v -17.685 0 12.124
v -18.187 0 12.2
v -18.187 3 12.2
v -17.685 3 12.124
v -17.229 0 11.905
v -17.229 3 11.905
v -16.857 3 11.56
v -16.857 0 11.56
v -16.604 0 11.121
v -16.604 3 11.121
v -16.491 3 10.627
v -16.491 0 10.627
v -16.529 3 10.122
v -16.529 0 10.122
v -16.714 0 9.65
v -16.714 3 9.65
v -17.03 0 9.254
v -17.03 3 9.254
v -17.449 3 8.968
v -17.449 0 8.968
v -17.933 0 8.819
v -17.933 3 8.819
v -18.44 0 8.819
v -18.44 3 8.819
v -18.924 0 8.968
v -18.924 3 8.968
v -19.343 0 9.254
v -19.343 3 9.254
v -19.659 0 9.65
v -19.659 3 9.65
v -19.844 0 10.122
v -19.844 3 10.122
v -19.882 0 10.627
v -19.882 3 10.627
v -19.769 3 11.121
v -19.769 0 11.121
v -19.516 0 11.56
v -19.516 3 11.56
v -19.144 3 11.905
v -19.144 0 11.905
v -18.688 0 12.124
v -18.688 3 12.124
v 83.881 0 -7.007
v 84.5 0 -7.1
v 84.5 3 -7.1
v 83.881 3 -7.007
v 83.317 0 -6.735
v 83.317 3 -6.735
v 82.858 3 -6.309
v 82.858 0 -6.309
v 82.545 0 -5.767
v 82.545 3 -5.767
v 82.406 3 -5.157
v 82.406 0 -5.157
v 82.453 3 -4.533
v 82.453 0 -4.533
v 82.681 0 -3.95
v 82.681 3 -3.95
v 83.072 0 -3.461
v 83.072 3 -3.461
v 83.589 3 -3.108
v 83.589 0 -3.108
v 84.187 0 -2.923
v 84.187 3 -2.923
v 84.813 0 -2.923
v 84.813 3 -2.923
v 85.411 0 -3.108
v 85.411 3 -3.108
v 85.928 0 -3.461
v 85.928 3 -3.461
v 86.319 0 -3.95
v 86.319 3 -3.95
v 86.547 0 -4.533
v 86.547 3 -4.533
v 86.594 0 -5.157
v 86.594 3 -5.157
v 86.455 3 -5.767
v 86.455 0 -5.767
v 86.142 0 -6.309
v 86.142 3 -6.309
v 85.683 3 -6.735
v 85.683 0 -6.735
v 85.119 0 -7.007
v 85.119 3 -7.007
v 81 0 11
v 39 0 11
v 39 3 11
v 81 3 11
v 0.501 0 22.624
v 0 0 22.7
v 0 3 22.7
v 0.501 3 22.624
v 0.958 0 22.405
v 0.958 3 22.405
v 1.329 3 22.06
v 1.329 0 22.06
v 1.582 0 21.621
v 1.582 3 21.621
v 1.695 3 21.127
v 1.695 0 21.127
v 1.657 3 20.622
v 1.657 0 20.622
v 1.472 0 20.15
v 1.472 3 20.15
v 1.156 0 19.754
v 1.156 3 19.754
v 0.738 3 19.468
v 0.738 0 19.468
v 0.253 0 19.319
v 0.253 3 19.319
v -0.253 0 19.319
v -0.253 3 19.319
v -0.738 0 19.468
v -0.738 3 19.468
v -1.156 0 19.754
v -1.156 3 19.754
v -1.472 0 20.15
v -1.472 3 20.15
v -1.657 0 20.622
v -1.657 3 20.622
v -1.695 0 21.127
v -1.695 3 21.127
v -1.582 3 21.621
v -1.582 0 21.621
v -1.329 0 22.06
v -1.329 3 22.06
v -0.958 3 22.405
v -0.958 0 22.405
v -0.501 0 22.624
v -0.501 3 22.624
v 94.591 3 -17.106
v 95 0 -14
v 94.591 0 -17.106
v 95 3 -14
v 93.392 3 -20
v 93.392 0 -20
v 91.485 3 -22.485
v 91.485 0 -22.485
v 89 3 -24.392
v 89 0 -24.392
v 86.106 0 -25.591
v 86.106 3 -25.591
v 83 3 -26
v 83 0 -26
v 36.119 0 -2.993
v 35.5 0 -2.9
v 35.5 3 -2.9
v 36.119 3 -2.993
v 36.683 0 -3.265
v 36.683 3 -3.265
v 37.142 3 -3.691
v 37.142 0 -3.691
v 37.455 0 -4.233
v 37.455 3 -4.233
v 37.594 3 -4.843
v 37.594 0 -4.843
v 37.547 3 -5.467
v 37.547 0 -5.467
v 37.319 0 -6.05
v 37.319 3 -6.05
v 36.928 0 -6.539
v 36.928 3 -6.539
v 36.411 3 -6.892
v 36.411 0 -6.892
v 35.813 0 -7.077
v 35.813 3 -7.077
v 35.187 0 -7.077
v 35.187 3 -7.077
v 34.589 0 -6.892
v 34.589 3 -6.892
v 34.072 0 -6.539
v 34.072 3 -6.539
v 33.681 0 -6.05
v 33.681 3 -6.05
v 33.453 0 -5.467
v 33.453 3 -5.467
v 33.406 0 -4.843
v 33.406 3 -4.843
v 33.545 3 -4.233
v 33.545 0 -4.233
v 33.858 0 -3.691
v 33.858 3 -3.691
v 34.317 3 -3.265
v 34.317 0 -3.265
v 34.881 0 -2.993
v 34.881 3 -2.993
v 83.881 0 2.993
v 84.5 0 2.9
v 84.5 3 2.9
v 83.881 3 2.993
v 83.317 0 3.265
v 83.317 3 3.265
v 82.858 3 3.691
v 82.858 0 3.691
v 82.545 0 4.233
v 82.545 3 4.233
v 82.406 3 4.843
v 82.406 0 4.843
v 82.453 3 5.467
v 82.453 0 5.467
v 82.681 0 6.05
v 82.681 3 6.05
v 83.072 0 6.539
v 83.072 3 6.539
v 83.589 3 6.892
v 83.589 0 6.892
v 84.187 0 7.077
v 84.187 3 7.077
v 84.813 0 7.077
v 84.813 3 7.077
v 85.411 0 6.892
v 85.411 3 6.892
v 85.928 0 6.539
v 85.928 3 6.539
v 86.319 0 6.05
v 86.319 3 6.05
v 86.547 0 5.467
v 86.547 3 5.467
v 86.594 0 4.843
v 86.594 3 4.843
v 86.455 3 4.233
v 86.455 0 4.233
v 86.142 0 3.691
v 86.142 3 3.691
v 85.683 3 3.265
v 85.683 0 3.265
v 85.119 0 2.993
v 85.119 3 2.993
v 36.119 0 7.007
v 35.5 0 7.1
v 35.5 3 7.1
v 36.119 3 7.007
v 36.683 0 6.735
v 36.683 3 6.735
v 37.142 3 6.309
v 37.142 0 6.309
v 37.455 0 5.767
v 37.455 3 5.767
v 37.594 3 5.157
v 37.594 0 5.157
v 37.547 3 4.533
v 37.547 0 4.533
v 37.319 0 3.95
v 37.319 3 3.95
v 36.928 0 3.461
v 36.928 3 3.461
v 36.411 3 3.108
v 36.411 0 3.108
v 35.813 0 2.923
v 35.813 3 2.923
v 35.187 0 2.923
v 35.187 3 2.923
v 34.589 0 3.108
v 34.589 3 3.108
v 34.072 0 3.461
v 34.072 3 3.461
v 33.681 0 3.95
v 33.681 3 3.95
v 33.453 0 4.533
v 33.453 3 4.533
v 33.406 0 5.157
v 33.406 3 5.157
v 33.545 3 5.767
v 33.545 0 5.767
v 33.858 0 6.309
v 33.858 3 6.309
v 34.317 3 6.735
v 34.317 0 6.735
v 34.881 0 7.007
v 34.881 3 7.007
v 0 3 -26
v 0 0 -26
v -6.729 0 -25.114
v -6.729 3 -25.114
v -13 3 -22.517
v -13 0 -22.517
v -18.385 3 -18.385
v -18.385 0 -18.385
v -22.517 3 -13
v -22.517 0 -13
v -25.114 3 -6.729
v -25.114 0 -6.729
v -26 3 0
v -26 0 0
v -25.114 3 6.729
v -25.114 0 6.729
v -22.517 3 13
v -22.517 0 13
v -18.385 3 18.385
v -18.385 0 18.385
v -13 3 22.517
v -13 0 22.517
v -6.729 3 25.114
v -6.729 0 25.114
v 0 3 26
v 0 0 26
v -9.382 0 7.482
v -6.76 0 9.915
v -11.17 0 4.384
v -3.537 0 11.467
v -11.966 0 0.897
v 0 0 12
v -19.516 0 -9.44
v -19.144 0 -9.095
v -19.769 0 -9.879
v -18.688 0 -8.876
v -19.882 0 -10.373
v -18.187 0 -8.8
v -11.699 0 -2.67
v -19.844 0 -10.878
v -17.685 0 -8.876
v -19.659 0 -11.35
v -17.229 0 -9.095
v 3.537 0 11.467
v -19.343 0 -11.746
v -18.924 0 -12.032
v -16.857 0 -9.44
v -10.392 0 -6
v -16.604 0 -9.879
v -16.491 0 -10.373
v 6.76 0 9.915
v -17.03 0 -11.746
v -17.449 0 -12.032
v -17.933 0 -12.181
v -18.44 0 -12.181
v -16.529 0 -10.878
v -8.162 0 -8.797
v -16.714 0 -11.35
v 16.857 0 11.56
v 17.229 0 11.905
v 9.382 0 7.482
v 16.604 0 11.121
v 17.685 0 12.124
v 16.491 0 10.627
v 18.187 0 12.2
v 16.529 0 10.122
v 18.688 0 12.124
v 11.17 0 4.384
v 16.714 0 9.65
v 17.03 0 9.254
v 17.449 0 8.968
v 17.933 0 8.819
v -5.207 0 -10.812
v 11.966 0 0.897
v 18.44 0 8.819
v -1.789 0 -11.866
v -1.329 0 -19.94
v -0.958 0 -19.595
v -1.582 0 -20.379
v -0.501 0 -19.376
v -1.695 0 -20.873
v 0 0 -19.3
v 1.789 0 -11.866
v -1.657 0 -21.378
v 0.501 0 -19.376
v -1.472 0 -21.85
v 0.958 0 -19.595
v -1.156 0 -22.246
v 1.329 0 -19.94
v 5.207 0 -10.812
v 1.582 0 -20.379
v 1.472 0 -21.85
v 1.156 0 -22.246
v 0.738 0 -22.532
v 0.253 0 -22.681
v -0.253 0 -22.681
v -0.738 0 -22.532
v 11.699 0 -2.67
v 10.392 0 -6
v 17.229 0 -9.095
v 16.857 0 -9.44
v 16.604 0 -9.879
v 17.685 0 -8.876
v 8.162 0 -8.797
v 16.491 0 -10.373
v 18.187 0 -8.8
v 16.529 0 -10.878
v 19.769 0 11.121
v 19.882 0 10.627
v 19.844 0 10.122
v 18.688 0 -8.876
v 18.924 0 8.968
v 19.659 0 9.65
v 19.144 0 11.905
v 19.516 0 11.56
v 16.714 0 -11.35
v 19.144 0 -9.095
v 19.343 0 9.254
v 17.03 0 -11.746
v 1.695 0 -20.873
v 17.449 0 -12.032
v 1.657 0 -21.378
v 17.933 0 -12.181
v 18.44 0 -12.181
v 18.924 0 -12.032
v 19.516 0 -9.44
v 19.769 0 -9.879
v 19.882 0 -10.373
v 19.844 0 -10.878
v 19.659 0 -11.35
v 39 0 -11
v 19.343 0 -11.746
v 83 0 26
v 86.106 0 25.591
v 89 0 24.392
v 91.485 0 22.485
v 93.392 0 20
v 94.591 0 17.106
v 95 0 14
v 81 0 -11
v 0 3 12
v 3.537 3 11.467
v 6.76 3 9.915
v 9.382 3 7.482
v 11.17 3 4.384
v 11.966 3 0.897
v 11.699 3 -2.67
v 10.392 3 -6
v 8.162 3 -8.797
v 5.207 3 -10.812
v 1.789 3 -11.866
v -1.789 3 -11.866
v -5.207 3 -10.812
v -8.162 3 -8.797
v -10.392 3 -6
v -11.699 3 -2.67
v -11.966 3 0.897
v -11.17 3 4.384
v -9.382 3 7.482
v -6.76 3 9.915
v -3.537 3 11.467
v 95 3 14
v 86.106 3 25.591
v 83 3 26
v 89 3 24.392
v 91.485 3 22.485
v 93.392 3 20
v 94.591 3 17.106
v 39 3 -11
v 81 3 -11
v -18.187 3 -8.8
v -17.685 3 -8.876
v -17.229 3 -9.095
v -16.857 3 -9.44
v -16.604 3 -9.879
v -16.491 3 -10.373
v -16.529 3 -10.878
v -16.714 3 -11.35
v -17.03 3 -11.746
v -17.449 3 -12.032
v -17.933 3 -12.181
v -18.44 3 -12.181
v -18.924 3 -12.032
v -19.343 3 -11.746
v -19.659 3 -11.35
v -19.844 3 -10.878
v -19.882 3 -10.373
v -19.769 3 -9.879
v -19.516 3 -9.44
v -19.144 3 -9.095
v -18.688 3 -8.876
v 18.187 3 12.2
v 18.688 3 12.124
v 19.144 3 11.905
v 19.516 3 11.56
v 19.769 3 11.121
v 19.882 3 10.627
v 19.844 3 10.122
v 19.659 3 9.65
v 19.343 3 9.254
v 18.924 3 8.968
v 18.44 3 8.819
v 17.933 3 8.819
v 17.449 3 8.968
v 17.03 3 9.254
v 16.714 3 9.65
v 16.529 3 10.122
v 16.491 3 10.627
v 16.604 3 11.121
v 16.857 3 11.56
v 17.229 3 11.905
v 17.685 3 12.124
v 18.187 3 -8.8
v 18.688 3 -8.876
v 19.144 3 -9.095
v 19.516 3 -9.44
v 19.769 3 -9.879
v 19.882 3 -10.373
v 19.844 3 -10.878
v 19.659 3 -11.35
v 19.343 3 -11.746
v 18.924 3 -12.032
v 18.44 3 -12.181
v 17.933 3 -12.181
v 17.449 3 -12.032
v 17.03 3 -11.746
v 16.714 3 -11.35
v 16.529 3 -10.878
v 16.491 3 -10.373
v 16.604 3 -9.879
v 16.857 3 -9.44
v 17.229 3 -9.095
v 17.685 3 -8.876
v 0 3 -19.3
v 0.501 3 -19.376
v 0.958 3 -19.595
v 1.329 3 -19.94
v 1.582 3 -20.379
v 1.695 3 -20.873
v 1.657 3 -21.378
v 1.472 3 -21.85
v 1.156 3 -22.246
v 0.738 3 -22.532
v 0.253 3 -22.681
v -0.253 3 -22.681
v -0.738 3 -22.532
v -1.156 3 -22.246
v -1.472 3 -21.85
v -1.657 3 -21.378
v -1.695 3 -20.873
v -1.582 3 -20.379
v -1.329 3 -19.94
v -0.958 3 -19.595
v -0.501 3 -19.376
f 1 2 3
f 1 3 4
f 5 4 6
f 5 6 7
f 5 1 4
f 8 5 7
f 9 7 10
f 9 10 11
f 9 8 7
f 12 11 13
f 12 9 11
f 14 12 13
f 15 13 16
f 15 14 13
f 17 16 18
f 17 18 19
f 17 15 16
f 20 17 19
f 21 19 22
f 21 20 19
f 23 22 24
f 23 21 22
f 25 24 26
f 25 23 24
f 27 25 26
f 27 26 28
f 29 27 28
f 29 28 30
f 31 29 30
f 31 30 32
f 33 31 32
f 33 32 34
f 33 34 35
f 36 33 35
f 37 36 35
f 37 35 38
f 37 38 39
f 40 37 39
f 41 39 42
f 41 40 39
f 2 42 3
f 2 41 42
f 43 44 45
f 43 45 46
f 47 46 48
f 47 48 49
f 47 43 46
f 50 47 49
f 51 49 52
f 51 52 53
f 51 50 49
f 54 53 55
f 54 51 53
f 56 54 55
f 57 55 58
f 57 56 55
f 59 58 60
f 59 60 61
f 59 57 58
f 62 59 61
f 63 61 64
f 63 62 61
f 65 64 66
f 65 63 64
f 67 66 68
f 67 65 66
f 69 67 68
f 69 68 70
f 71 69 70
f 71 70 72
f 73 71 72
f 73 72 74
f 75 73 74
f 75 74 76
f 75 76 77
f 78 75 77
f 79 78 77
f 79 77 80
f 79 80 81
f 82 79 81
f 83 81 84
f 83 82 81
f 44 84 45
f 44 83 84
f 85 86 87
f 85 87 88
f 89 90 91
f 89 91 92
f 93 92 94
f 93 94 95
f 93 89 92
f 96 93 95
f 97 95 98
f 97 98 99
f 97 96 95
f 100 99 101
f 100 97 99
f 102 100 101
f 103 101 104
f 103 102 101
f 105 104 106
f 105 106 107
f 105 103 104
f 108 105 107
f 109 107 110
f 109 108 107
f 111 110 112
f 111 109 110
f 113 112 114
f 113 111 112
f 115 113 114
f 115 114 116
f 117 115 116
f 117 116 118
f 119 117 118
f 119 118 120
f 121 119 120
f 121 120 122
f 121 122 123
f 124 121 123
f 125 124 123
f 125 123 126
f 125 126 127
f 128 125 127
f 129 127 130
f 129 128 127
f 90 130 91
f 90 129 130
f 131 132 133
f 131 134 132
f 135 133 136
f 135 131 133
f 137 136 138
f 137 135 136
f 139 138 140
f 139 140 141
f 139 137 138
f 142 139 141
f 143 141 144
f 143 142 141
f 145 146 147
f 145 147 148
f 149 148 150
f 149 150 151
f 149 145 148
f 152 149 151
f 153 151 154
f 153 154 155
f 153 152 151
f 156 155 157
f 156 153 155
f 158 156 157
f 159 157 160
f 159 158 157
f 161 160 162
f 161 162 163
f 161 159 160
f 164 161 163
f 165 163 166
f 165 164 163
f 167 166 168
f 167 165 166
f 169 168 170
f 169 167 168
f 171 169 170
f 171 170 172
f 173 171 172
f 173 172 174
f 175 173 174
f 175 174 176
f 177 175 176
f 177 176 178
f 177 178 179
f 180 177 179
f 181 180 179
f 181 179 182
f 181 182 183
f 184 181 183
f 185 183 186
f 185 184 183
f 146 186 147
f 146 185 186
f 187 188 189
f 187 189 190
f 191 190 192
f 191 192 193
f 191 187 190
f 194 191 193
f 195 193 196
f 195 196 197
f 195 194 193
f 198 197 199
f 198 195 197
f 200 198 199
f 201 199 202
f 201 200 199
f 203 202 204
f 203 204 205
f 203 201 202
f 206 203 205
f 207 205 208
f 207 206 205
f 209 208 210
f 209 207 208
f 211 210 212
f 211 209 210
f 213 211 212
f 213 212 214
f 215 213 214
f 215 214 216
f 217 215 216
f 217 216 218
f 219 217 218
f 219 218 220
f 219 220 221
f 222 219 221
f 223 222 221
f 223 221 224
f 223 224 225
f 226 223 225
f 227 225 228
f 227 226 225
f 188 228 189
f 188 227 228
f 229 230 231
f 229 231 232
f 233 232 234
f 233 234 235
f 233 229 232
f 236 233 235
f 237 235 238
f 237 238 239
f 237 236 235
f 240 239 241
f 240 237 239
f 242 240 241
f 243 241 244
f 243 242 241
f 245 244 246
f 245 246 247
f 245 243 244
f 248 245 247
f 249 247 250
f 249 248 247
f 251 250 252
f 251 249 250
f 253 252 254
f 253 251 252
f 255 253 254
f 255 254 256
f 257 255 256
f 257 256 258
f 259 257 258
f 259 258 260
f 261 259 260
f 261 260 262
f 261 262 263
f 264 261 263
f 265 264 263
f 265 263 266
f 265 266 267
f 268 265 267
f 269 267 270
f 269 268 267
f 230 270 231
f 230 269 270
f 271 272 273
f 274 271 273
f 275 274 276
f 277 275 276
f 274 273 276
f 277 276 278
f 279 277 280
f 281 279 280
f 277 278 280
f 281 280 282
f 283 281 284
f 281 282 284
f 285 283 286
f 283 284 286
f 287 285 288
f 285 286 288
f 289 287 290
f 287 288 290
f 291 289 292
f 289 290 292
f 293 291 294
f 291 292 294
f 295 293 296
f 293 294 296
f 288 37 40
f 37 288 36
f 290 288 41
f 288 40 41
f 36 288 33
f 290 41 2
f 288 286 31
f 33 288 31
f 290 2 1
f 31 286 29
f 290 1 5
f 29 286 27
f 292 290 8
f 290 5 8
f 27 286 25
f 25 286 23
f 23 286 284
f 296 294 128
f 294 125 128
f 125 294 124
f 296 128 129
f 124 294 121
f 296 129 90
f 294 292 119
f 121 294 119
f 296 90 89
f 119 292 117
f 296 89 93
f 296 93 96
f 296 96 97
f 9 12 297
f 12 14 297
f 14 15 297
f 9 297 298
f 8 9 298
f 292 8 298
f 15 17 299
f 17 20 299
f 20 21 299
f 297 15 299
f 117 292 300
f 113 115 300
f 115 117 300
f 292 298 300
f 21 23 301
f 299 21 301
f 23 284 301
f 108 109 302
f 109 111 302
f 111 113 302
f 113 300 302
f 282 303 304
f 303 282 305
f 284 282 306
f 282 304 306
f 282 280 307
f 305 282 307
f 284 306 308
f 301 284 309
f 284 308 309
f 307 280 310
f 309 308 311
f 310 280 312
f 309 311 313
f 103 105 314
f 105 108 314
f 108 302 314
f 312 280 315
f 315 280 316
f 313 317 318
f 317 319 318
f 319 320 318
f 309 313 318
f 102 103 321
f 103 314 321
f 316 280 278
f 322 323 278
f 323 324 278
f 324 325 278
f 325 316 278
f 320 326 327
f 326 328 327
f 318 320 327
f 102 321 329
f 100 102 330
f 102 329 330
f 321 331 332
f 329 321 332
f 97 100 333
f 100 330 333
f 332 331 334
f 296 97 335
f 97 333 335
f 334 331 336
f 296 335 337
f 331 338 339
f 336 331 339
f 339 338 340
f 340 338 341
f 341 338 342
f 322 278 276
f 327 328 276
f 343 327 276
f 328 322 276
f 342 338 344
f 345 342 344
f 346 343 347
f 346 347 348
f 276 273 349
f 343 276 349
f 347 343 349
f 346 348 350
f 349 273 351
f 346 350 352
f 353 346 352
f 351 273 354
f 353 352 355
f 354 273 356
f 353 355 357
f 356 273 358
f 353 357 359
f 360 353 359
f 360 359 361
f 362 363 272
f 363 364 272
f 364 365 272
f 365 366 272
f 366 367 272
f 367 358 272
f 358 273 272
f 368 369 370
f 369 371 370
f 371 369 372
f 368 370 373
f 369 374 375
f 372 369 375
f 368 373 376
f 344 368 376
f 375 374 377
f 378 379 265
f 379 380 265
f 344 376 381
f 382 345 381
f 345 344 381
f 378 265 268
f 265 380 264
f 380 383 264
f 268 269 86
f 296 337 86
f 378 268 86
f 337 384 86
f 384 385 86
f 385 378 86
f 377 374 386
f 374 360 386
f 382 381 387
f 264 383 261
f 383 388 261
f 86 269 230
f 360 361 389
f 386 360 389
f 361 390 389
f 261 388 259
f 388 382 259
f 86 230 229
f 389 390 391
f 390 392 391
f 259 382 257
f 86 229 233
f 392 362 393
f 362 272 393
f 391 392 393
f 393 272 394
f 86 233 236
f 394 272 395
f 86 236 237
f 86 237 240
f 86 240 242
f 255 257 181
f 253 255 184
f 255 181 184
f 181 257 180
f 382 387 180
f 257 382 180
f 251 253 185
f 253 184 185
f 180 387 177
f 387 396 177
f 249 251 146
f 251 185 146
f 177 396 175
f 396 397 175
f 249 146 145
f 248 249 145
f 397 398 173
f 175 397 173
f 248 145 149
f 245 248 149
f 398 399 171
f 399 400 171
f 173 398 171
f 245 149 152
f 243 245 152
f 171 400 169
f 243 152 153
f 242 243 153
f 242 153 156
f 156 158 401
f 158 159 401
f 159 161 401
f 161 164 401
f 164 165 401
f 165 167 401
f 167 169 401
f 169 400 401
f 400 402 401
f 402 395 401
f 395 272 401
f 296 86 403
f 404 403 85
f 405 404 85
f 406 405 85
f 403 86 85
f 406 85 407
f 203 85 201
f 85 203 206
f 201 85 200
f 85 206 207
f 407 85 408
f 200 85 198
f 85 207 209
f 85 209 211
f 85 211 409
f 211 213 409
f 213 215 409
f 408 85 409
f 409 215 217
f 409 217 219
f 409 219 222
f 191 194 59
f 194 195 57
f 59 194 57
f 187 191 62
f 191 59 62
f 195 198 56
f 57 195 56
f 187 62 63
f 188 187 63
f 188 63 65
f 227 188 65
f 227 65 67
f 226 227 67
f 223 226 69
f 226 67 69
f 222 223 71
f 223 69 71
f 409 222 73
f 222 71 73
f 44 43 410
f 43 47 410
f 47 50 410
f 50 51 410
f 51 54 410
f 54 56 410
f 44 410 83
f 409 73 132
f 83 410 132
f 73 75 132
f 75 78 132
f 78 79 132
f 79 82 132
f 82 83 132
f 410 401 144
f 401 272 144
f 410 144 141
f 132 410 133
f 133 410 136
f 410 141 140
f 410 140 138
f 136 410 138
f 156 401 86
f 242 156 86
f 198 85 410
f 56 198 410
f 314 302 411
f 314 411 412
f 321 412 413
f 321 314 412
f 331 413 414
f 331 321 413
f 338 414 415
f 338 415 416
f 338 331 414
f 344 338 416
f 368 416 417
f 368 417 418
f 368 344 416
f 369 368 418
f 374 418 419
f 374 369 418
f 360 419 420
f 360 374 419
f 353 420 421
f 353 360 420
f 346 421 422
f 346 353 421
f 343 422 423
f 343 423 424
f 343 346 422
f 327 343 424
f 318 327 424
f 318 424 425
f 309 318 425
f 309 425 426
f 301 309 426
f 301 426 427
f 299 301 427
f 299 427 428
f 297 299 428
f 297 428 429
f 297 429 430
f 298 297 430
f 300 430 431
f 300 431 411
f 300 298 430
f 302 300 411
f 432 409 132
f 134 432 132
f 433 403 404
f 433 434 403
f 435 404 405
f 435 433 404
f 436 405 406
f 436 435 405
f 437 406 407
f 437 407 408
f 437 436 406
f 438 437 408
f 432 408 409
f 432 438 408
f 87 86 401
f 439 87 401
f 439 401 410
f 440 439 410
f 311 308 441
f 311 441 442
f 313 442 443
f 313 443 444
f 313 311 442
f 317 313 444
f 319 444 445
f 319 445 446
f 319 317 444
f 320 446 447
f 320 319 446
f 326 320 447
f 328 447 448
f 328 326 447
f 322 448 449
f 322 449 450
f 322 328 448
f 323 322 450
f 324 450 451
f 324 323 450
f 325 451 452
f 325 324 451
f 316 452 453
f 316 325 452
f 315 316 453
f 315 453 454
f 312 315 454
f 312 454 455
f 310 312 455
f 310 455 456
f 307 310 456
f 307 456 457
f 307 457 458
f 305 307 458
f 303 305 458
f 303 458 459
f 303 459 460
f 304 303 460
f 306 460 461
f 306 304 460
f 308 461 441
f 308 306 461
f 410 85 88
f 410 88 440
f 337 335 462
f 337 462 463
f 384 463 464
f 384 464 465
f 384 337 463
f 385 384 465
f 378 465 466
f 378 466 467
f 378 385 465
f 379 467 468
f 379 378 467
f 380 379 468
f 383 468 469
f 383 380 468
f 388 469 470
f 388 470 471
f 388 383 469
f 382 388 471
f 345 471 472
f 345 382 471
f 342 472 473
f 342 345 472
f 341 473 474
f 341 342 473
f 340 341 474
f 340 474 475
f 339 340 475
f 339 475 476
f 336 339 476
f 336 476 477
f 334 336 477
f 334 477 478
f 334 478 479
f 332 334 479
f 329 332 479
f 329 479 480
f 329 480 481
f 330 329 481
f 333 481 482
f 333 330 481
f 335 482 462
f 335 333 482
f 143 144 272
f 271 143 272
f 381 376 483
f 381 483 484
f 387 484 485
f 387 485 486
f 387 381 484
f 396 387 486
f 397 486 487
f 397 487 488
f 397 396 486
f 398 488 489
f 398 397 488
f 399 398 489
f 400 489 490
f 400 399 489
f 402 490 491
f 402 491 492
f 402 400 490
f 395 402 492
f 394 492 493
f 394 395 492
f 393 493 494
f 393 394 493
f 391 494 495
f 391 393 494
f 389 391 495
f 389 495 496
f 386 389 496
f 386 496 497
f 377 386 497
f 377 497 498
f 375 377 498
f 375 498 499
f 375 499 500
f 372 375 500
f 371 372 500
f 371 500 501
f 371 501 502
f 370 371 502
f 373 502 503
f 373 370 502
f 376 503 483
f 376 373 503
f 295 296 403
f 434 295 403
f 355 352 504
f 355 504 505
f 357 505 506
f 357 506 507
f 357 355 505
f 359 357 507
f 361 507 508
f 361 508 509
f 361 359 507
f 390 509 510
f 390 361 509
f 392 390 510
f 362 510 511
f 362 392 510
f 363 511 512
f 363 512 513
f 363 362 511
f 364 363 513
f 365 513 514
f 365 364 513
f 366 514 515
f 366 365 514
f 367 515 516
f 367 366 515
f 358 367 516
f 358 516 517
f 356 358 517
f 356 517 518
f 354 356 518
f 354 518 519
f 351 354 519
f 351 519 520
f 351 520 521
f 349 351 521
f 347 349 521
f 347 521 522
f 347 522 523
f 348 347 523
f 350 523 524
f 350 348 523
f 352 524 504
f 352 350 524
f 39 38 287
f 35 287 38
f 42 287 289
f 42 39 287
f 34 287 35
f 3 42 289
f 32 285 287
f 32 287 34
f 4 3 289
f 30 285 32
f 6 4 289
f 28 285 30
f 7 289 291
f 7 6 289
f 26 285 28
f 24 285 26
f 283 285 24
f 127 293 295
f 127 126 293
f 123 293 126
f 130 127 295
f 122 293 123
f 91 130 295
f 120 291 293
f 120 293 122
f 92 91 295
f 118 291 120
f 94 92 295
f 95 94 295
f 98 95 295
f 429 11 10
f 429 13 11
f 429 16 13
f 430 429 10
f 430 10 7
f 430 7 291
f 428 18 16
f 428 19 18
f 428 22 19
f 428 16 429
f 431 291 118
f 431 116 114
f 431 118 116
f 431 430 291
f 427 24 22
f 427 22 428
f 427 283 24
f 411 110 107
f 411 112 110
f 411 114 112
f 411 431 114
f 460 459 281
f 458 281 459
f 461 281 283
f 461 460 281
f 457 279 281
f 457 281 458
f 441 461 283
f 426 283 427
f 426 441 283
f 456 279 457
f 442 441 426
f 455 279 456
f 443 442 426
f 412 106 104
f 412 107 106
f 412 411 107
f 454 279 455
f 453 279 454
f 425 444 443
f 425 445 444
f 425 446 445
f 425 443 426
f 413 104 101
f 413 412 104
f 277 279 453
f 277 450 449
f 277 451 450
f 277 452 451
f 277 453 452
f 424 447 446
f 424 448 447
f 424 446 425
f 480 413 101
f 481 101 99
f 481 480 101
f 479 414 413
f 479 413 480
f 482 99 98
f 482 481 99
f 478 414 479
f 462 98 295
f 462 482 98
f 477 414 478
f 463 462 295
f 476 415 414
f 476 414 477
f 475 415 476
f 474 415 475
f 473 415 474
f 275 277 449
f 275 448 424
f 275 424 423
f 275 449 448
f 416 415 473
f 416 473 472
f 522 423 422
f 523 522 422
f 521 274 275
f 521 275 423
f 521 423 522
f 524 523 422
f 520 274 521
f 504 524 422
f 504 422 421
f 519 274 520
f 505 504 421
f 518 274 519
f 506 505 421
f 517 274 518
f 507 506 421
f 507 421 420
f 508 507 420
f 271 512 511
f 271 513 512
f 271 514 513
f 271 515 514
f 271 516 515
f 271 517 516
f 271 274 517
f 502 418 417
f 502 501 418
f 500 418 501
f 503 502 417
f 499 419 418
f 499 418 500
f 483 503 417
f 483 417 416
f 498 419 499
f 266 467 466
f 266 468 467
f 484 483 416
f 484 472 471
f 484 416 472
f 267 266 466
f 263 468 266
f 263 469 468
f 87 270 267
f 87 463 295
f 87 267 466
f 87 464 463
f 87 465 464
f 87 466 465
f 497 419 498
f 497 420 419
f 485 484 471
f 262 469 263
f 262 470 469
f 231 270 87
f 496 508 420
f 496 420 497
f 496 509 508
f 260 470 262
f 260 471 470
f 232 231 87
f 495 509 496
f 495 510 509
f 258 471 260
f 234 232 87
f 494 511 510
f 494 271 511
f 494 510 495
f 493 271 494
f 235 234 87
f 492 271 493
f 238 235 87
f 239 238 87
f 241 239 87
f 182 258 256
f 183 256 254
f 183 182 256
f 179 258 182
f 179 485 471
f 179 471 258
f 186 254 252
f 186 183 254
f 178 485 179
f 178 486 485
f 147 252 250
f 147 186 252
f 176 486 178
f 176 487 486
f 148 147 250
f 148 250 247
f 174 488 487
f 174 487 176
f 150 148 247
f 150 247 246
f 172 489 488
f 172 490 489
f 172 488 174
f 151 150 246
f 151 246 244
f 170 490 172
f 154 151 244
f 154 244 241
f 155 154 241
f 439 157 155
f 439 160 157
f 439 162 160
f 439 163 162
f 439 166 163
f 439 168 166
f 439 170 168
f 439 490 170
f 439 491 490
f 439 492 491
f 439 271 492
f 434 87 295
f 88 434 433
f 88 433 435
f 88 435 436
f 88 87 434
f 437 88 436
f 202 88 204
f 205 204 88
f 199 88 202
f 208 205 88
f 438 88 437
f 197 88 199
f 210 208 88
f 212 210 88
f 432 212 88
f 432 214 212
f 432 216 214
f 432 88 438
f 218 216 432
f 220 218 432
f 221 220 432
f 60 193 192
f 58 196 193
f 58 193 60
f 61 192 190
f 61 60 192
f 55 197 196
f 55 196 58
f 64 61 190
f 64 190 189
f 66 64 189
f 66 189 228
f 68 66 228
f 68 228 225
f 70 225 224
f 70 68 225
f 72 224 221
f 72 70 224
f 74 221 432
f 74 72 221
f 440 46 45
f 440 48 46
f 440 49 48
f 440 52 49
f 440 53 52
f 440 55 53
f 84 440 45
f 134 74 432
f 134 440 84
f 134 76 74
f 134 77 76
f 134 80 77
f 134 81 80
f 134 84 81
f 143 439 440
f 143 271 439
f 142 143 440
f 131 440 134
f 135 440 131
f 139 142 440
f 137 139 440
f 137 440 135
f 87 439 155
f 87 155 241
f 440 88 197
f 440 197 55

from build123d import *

# Parameters (mm, degrees)
SKETCH_1_R      = 12
SKETCH_1_R_2    = 1.7
SKETCH_1_R_3    = 2.1
SKETCH_1_W      = 42
SKETCH_1_H      = 22
EXTRUDE_1_DEPTH = 3
FILLET_1_R      = 12


with BuildPart() as part:
    # 草图1 → 凸台-拉伸1 (new body)
    with BuildSketch(Plane(origin=(0, 0, 0), x_dir=(1, 0, 0), z_dir=(0, 1, 0))):
        with BuildLine():
            Line((0, -26), (95, -26))
            Line((95, -26), (95, 26))
            Line((95, 26), (0, 26))
            ThreePointArc((0, 26), (-26, 0), (0, -26))
        make_face()
        with Locations(Location((0, 0, 0), (0, 0, 270))):
            Circle(SKETCH_1_R, mode=Mode.SUBTRACT)
        with Locations(Location((0, -21, 0), (0, 0, 270))):
            Circle(SKETCH_1_R_2, mode=Mode.SUBTRACT)
        with Locations(Location((35.5, 5, 0), (0, 0, 270))):
            Circle(SKETCH_1_R_3, mode=Mode.SUBTRACT)
        with Locations(Location((35.5, -5, 0), (0, 0, 270))):
            Circle(SKETCH_1_R_3, mode=Mode.SUBTRACT)
        with Locations(Location((84.5, -5, 0), (0, 0, 90))):
            Circle(SKETCH_1_R_3, mode=Mode.SUBTRACT)
        with Locations(Location((84.5, 5, 0), (0, 0, 90))):
            Circle(SKETCH_1_R_3, mode=Mode.SUBTRACT)
        with Locations(Location((-18.186533479, -10.5, 0), (0, 0, 270))):
            Circle(SKETCH_1_R_2, mode=Mode.SUBTRACT)
        with Locations(Location((-18.186533479, 10.5, 0), (0, 0, 270))):
            Circle(SKETCH_1_R_2, mode=Mode.SUBTRACT)
        with Locations(Location((0, 21, 0), (0, 0, 270))):
            Circle(SKETCH_1_R_2, mode=Mode.SUBTRACT)
        with Locations(Location((18.186533479, 10.5, 0), (0, 0, 270))):
            Circle(SKETCH_1_R_2, mode=Mode.SUBTRACT)
        with Locations(Location((18.186533479, -10.5, 0), (0, 0, 270))):
            Circle(SKETCH_1_R_2, mode=Mode.SUBTRACT)
        with Locations((60, 0)):
            Rectangle(SKETCH_1_W, SKETCH_1_H, mode=Mode.SUBTRACT)
    extrude(amount=EXTRUDE_1_DEPTH)

    # 圆角1
    fillet_1_edges = [part.edges().sort_by_distance(p)[0] for p in [
        (95, 1.5, -26),
        (95, 1.5, 26),
    ]]
    fillet(fillet_1_edges, radius=FILLET_1_R)


solid = part.part
